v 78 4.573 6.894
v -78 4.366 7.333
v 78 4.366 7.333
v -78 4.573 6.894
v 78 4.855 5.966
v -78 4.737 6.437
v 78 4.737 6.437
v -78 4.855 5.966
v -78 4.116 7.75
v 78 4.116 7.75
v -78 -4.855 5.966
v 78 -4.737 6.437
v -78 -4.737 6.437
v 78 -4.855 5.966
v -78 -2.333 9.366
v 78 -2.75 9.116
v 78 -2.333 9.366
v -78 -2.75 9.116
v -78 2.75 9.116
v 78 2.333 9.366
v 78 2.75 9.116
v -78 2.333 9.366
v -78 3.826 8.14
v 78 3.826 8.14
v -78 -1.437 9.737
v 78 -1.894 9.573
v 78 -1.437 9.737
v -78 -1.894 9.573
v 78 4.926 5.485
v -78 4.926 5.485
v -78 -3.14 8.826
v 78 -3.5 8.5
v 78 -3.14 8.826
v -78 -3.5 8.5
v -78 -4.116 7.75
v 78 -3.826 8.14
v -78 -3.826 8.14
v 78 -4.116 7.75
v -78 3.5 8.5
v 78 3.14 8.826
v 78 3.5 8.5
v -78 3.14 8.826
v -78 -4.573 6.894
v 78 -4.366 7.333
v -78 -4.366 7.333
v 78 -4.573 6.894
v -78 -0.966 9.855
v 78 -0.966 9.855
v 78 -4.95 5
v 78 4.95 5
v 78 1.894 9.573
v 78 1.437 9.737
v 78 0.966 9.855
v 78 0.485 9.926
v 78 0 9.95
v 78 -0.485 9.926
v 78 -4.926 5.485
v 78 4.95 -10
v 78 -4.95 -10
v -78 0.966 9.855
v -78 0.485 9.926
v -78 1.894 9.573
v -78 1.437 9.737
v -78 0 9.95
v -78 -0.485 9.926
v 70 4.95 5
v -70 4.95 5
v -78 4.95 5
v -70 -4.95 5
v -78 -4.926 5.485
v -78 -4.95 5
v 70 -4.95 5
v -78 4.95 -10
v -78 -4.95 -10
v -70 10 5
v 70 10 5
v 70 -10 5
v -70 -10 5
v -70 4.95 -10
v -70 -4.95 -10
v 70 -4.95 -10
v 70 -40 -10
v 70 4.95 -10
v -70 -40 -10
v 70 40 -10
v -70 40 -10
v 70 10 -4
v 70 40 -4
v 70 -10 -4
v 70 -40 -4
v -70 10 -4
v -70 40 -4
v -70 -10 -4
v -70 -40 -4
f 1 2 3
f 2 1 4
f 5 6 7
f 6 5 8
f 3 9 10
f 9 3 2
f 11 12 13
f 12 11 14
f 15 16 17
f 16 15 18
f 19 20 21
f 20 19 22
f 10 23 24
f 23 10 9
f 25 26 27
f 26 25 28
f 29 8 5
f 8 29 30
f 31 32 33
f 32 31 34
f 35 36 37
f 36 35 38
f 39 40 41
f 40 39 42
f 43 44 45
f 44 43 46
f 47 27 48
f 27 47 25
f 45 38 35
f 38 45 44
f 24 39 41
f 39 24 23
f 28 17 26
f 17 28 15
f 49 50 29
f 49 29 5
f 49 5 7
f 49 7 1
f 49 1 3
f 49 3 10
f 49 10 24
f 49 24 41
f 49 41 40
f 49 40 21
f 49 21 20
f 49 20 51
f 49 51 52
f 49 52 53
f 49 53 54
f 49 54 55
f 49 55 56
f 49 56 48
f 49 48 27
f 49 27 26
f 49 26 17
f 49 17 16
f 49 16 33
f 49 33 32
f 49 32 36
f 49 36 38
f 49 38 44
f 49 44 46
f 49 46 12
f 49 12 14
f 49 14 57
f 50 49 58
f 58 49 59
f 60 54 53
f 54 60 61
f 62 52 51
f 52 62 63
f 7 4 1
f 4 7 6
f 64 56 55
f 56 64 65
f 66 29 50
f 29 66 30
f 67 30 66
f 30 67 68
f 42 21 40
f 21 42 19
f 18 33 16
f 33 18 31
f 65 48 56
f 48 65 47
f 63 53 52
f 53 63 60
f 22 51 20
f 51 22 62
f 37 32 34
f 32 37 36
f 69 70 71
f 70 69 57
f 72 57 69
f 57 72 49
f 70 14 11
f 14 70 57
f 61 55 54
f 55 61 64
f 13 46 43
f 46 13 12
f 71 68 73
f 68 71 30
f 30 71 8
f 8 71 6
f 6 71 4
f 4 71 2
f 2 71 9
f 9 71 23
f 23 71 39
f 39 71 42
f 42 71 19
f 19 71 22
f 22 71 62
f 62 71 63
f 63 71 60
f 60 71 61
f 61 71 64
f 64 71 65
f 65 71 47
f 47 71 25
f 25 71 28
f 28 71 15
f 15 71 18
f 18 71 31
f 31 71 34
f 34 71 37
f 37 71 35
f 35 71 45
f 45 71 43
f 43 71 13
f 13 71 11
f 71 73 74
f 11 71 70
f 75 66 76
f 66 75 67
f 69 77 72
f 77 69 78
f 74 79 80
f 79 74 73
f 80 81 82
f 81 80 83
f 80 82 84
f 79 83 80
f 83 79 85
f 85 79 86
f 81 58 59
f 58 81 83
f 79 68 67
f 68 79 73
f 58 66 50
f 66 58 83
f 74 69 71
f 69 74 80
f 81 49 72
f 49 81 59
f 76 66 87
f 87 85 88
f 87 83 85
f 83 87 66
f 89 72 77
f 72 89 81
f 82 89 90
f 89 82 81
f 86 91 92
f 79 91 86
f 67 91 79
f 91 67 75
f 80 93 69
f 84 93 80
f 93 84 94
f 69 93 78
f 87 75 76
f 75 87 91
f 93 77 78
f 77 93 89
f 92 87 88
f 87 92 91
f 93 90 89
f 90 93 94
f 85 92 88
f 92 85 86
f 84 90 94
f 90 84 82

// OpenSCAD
// file: ../parts/bracket_side_plate.scad
include <../config/parameters.scad>

// Zet deze op 'true' om het model plat te leggen voor DXF export
export_als_dxf = false; 

if (export_als_dxf) {
    projection(cut = false) 
        rotate([0, 90, 0]) 
            bracket_side_plate(show_bend = false, bend_angle = 90);
} else {
    // 3D weergave (nu bij 'false')
    bracket_side_plate(show_bend = false, bend_angle = 90);
}

module bracket_side_plate(show_bend = true, bend_angle = 90) {
    h_total = arm_height + axle_bottom_dist;
    z_center = (arm_height - axle_bottom_dist) / 2;
    
    y_center_width = side_plate_width - (2 * extra_space_bracket);

    color("#A0A0A0") {
        difference() {
            if (show_bend) {
                union() {
                    translate([0, 0, z_center])
                        cube([bracket_thick, y_center_width, h_total], center=true);

                    translate([0, y_center_width / 2, z_center])
                        rotate([0, 0, bend_angle])
                            translate([0, extra_space_bracket / 2, 0])
                                cube([bracket_thick, extra_space_bracket, h_total], center=true);

                    translate([0, -y_center_width / 2, z_center])
                        rotate([0, 0, -bend_angle])
                            translate([0, -extra_space_bracket / 2, 0])
                                cube([bracket_thick, extra_space_bracket, h_total], center=true);

                    for (y = [-1, 1]) {
                        translate([0, y * tab_offset_y, arm_height + (bracket_thick / 2)])
                            cube([bracket_thick, tab_length, bracket_thick], center=true);
                    }
                }
            } else {
                union() {
                    hull() { 
                        translate([0, 0, arm_height]) 
                            cube([bracket_thick, side_plate_width, 0.1], center=true);
                        translate([0, 0, -axle_bottom_dist])
                            cube([bracket_thick, side_plate_width, 0.1], center=true);
                    }
                    
                    for (y = [-1, 1]) {
                        translate([0, y * tab_offset_y, arm_height + (bracket_thick / 2)])
                            cube([bracket_thick, tab_length, bracket_thick], center=true);
                    }
                }
            }

            rotate([0, 90, 0]) {
                translate([-5, 0, 0]) 
                    cylinder(d = axle_dia, h = bracket_thick + 10, center = true);
                translate([axle_bottom_dist / 2, 0, 0])
                    cube([axle_bottom_dist + 8, axle_dia, bracket_thick + 10], center = true);
            }

            rotate([0, 90, 0]) {
                translate([0, axle_hole_distance, 0])
                    cylinder(d = axle_hole_diameter, h = bracket_thick + 10, center = true);
                translate([0, -axle_hole_distance, 0])
                    cylinder(d = axle_hole_diameter, h = bracket_thick + 10, center = true);
            }

            for (z_pos = [-axle_bottom_dist + side_hole_start_from_bottom : side_hole_pitch : arm_height - side_hole_start_from_bottom]) {
                
                if (show_bend) {
                    translate([0, y_center_width / 2, 0])
                        rotate([0, 0, bend_angle])
                            translate([0, extra_space_bracket / 2, z_pos])
                                rotate([0, 90, 0])
                                    cylinder(d = bracket_bolt_diameter, h = bracket_thick + 20, center = true);
                    
                    translate([0, -y_center_width / 2, 0])
                        rotate([0, 0, -bend_angle])
                            translate([0, -extra_space_bracket / 2, z_pos])
                                rotate([0, 90, 0])
                                    cylinder(d = bracket_bolt_diameter, h = bracket_thick + 20, center = true);
                } else {
                    translate([0, y_center_width / 2 + extra_space_bracket / 2, z_pos])
                        rotate([0, 90, 0])
                            cylinder(d = bracket_bolt_diameter, h = bracket_thick + 20, center = true);
                    
                    translate([0, -(y_center_width / 2 + extra_space_bracket / 2), z_pos])
                        rotate([0, 90, 0])
                            cylinder(d = bracket_bolt_diameter, h = bracket_thick + 20, center = true);
                }
            }
        }
    }
}
// file: ../config/parameters.scad
// Global Chassis Dimensions
chassis_width = 750; //kies een veelvoud van 50  
chassis_length = 1000; //kies een veelvoud van 50

// --- Modulair Gatenpatroon (Grid) ---
grid_step = 50; // Universele stapgrootte voor alle gaten

// bolt diameters
m12_bolt_diameter = 12.4; //dikte van de gaten van m12 bout
m10_bolt_diameter = 10.4; //dikte van de gaten van m10 bout
m8_bolt_diameter = 8.4; //dikte van de gaten van m8 bout  


// --- Bereiken (Ranges) voor de Robot Afmetingen ---
// Bereik voor de BREEDTE 
chassis_width_min = 350;
chassis_width_max = 850;

// Bereik voor de LENGTE 
chassis_length_min = 700;
chassis_length_max = 1100;

// Bereik voor de BASE PLATE 
base_length_min = 800;
base_length_max = 1300;

// Beam Profile (Purchased Part)
beam_profile = 40;
beam_thickness = 2;    
beam_length_1 = 1000;
beam_length_2 = 1300;

// Upright & Cover
base_plate_length = 1300;
connect_plate_thick = 5; 
upright_height = 500;
top_side_width = 60;
cover_thick = 5;
cover_clearance = 10;  
cover_overlap = 10;
cover_total_height = 530; 
hole_distance_cover = 30;

// Resolution & Preview
$fn = 60; 
exploded_view = false; 
explosion_dist = 800; 

// Motor & Wheel Data
tire_dia = 430;
tire_width = 100;
hub_dia = 160;
hub_width = 140; //specs from Quinder are: Fork width for mounting: 138mm
axle_dia = 10.2; //specs from Quinder are: Mounting hole: max 10.2mm, zou iets strakker mogen naar 10.1mm, 10.2 nog wat spelling
bolt_dia = 14.2;

// Bracket Geometry universal
bracket_thick = 4;
bracket_bolt_diameter = 10.4; //dikte van de gaten van gaten van de wiel_bracket  
bracket_m8_bolt_diameter = 8.4; //dikte van de gaten van m8 bout  
tire_clearance = 130;      
side_plate_top_width = 240;
side_plate_width = 240;

//Side plate
axle_bottom_dist = 35;
extra_space_bracket = 40;
side_hole_start_from_bottom = 20; 
side_hole_pitch = 100; 

tab_length = 40;         // Lengte van de nok/sleuf
tab_offset_y = 40;       // Positie vanaf het midden over de Y-as (uit elkaar)
laser_tolerance = 1.0;   // Extra snijspeling zodat het makkelijk in elkaar schuift

//top plate
bracket_top_hole_dist_x = 100; // De totale gewenste afstand over de X-as veelvoud van 50 maken
bracket_top_hole_dist_y = 150; // De totale gewenste afstand over de Y-as veelvoud van 50 maken
bracket_top_hole_distance_centrum_holes = 50; //De afstand van centrum gat tot centrum gat in het hart

arm_height = (tire_dia / 2) + tire_clearance;
inner_width = hub_width;
bracket_total_width = inner_width + (extra_space_bracket*2) + (2 * bracket_thick);
bracket_top_z = arm_height + bracket_thick;

// Axle bracket
axle_hex_width = 110;          
axle_hex_height = 40;
axle_hex_straight_part = 30;   
axle_bracket_thickness = 4;    

axle_hole_diameter = 10.3; //Dikte van het gaten in de axle_bracket
axle_hole_distance = 40; //hoogte vanaf de onderkant tot de wiel ophanging

axle_flat_width = axle_dia; // Gebruikt 10.3 uit parameters 
axle_round_dia = bolt_dia;  // Gebruikt 14.2 uit parameters

// --- Caster Wheel Parameters ---  
bracket_width            = 80;  
bracket_thickness        = 4;
caster_wheel_axle_width  = 130;   
caster_wheel_axle_diameter = 20;
bracket_axle_hole_diameter = 10.4;

pivot_cylinder_dia       = 30;  
pivot_cylinder_height    = 100;  

outer_cylinder_thickness = 5;   
outer_cylinder_height    = 60;  
outer_cylinder_z_offset  = 33;   
kap_speling              = 1;   

tube_width               = 35;  
tube_thickness           = 2;   
tube_length              = 400;
tube_length_min          = 240;
// main file
// ==========================================
// LOCAL TEMPLATE CONFIG (Hardcoded)
// ==========================================
// Lasmal die op de plaats van de wielas valt en de zijplaten onderin
// exact op de binnenmaat (inner_width) uit elkaar houdt, zodat ze tijdens
// het lassen niet naar binnen trekken.
// De tong heeft een ronde kop en valt in het asgat, net als de echte as.

tpl_span_adjust  = 0;      // 0 = exact 140 mm. -0.2 voor speling, +0.2 voor lichte voorspanning
tpl_clearance    = 0.3;    // Speling zodat de ronde kop in het asgat (10.2) valt
tpl_tongue_extra = 4;      // Extra uitsteek voorbij de buitenkant van de zijplaat (0 = vlak)

tpl_web_height   = 15;     // Hoogte van de rug, gemeten vanaf het hart van de as naar beneden
tpl_web_width    = 20;     // Y-breedte van de rug tussen de platen => vormt de aanslag

tpl_wing_width   = 80;     // Y-breedte van de vierkante vleugels
tpl_wing_thick   = 6;      // Z-dikte van de vleugels
tpl_wing_inset   = 0;      // Vleugels korter dan de binnenmaat (0 = volle lengte, beste steun)

// DEBUG MODE - Zet op 'false' voordat je de STL exporteert
show_reference = true;

// ==========================================
// EXTERNAL DATA (Linked)
// ==========================================
include <../config/parameters.scad>;
use <../parts/bracket_side_plate.scad>;

// ==========================================
// GEDEELDE AFMETINGEN
// ==========================================
tpl_span       = inner_width + tpl_span_adjust;
tpl_tongue_len = bracket_thick + tpl_tongue_extra;
tpl_total_len  = tpl_span + (2 * tpl_tongue_len);

tpl_tongue_w   = axle_dia - tpl_clearance;
tpl_seat_z     = axle_hole_distance - axle_bottom_dist;

tpl_bottom_z   = tpl_seat_z - tpl_web_height;
tpl_body_cz    = tpl_seat_z - (tpl_web_height / 2);
tpl_wing_cz    = tpl_bottom_z + (tpl_wing_thick / 2);

tpl_plate_face = inner_width / 2;

// ==========================================
// GEOMETRY LOGIC
// ==========================================

module distance_template() {
    union() {
        translate([0, 0, tpl_seat_z])
            rotate([0, 90, 0])
                cylinder(d = tpl_tongue_w, h = tpl_total_len, center = true, $fn = 64);

        translate([0, 0, tpl_body_cz])
            cube([tpl_total_len, tpl_tongue_w, tpl_web_height], center=true);

        translate([0, 0, tpl_body_cz])
            cube([tpl_span, tpl_web_width, tpl_web_height], center=true);

        translate([0, 0, tpl_wing_cz])
            cube([tpl_span - (2 * tpl_wing_inset), tpl_wing_width, tpl_wing_thick], center=true);
    }
}

// ==========================================
// RENDER
// ==========================================

color("DodgerBlue") {
    distance_template();
}

if (show_reference) {
    for (i = [-1, 1]) {
        translate([i * (tpl_plate_face + (bracket_thick / 2)), 0, 0])
            rotate([0, 0, (i == 1) ? 180 : 0])
                %bracket_side_plate(show_bend = true);
    }
}
